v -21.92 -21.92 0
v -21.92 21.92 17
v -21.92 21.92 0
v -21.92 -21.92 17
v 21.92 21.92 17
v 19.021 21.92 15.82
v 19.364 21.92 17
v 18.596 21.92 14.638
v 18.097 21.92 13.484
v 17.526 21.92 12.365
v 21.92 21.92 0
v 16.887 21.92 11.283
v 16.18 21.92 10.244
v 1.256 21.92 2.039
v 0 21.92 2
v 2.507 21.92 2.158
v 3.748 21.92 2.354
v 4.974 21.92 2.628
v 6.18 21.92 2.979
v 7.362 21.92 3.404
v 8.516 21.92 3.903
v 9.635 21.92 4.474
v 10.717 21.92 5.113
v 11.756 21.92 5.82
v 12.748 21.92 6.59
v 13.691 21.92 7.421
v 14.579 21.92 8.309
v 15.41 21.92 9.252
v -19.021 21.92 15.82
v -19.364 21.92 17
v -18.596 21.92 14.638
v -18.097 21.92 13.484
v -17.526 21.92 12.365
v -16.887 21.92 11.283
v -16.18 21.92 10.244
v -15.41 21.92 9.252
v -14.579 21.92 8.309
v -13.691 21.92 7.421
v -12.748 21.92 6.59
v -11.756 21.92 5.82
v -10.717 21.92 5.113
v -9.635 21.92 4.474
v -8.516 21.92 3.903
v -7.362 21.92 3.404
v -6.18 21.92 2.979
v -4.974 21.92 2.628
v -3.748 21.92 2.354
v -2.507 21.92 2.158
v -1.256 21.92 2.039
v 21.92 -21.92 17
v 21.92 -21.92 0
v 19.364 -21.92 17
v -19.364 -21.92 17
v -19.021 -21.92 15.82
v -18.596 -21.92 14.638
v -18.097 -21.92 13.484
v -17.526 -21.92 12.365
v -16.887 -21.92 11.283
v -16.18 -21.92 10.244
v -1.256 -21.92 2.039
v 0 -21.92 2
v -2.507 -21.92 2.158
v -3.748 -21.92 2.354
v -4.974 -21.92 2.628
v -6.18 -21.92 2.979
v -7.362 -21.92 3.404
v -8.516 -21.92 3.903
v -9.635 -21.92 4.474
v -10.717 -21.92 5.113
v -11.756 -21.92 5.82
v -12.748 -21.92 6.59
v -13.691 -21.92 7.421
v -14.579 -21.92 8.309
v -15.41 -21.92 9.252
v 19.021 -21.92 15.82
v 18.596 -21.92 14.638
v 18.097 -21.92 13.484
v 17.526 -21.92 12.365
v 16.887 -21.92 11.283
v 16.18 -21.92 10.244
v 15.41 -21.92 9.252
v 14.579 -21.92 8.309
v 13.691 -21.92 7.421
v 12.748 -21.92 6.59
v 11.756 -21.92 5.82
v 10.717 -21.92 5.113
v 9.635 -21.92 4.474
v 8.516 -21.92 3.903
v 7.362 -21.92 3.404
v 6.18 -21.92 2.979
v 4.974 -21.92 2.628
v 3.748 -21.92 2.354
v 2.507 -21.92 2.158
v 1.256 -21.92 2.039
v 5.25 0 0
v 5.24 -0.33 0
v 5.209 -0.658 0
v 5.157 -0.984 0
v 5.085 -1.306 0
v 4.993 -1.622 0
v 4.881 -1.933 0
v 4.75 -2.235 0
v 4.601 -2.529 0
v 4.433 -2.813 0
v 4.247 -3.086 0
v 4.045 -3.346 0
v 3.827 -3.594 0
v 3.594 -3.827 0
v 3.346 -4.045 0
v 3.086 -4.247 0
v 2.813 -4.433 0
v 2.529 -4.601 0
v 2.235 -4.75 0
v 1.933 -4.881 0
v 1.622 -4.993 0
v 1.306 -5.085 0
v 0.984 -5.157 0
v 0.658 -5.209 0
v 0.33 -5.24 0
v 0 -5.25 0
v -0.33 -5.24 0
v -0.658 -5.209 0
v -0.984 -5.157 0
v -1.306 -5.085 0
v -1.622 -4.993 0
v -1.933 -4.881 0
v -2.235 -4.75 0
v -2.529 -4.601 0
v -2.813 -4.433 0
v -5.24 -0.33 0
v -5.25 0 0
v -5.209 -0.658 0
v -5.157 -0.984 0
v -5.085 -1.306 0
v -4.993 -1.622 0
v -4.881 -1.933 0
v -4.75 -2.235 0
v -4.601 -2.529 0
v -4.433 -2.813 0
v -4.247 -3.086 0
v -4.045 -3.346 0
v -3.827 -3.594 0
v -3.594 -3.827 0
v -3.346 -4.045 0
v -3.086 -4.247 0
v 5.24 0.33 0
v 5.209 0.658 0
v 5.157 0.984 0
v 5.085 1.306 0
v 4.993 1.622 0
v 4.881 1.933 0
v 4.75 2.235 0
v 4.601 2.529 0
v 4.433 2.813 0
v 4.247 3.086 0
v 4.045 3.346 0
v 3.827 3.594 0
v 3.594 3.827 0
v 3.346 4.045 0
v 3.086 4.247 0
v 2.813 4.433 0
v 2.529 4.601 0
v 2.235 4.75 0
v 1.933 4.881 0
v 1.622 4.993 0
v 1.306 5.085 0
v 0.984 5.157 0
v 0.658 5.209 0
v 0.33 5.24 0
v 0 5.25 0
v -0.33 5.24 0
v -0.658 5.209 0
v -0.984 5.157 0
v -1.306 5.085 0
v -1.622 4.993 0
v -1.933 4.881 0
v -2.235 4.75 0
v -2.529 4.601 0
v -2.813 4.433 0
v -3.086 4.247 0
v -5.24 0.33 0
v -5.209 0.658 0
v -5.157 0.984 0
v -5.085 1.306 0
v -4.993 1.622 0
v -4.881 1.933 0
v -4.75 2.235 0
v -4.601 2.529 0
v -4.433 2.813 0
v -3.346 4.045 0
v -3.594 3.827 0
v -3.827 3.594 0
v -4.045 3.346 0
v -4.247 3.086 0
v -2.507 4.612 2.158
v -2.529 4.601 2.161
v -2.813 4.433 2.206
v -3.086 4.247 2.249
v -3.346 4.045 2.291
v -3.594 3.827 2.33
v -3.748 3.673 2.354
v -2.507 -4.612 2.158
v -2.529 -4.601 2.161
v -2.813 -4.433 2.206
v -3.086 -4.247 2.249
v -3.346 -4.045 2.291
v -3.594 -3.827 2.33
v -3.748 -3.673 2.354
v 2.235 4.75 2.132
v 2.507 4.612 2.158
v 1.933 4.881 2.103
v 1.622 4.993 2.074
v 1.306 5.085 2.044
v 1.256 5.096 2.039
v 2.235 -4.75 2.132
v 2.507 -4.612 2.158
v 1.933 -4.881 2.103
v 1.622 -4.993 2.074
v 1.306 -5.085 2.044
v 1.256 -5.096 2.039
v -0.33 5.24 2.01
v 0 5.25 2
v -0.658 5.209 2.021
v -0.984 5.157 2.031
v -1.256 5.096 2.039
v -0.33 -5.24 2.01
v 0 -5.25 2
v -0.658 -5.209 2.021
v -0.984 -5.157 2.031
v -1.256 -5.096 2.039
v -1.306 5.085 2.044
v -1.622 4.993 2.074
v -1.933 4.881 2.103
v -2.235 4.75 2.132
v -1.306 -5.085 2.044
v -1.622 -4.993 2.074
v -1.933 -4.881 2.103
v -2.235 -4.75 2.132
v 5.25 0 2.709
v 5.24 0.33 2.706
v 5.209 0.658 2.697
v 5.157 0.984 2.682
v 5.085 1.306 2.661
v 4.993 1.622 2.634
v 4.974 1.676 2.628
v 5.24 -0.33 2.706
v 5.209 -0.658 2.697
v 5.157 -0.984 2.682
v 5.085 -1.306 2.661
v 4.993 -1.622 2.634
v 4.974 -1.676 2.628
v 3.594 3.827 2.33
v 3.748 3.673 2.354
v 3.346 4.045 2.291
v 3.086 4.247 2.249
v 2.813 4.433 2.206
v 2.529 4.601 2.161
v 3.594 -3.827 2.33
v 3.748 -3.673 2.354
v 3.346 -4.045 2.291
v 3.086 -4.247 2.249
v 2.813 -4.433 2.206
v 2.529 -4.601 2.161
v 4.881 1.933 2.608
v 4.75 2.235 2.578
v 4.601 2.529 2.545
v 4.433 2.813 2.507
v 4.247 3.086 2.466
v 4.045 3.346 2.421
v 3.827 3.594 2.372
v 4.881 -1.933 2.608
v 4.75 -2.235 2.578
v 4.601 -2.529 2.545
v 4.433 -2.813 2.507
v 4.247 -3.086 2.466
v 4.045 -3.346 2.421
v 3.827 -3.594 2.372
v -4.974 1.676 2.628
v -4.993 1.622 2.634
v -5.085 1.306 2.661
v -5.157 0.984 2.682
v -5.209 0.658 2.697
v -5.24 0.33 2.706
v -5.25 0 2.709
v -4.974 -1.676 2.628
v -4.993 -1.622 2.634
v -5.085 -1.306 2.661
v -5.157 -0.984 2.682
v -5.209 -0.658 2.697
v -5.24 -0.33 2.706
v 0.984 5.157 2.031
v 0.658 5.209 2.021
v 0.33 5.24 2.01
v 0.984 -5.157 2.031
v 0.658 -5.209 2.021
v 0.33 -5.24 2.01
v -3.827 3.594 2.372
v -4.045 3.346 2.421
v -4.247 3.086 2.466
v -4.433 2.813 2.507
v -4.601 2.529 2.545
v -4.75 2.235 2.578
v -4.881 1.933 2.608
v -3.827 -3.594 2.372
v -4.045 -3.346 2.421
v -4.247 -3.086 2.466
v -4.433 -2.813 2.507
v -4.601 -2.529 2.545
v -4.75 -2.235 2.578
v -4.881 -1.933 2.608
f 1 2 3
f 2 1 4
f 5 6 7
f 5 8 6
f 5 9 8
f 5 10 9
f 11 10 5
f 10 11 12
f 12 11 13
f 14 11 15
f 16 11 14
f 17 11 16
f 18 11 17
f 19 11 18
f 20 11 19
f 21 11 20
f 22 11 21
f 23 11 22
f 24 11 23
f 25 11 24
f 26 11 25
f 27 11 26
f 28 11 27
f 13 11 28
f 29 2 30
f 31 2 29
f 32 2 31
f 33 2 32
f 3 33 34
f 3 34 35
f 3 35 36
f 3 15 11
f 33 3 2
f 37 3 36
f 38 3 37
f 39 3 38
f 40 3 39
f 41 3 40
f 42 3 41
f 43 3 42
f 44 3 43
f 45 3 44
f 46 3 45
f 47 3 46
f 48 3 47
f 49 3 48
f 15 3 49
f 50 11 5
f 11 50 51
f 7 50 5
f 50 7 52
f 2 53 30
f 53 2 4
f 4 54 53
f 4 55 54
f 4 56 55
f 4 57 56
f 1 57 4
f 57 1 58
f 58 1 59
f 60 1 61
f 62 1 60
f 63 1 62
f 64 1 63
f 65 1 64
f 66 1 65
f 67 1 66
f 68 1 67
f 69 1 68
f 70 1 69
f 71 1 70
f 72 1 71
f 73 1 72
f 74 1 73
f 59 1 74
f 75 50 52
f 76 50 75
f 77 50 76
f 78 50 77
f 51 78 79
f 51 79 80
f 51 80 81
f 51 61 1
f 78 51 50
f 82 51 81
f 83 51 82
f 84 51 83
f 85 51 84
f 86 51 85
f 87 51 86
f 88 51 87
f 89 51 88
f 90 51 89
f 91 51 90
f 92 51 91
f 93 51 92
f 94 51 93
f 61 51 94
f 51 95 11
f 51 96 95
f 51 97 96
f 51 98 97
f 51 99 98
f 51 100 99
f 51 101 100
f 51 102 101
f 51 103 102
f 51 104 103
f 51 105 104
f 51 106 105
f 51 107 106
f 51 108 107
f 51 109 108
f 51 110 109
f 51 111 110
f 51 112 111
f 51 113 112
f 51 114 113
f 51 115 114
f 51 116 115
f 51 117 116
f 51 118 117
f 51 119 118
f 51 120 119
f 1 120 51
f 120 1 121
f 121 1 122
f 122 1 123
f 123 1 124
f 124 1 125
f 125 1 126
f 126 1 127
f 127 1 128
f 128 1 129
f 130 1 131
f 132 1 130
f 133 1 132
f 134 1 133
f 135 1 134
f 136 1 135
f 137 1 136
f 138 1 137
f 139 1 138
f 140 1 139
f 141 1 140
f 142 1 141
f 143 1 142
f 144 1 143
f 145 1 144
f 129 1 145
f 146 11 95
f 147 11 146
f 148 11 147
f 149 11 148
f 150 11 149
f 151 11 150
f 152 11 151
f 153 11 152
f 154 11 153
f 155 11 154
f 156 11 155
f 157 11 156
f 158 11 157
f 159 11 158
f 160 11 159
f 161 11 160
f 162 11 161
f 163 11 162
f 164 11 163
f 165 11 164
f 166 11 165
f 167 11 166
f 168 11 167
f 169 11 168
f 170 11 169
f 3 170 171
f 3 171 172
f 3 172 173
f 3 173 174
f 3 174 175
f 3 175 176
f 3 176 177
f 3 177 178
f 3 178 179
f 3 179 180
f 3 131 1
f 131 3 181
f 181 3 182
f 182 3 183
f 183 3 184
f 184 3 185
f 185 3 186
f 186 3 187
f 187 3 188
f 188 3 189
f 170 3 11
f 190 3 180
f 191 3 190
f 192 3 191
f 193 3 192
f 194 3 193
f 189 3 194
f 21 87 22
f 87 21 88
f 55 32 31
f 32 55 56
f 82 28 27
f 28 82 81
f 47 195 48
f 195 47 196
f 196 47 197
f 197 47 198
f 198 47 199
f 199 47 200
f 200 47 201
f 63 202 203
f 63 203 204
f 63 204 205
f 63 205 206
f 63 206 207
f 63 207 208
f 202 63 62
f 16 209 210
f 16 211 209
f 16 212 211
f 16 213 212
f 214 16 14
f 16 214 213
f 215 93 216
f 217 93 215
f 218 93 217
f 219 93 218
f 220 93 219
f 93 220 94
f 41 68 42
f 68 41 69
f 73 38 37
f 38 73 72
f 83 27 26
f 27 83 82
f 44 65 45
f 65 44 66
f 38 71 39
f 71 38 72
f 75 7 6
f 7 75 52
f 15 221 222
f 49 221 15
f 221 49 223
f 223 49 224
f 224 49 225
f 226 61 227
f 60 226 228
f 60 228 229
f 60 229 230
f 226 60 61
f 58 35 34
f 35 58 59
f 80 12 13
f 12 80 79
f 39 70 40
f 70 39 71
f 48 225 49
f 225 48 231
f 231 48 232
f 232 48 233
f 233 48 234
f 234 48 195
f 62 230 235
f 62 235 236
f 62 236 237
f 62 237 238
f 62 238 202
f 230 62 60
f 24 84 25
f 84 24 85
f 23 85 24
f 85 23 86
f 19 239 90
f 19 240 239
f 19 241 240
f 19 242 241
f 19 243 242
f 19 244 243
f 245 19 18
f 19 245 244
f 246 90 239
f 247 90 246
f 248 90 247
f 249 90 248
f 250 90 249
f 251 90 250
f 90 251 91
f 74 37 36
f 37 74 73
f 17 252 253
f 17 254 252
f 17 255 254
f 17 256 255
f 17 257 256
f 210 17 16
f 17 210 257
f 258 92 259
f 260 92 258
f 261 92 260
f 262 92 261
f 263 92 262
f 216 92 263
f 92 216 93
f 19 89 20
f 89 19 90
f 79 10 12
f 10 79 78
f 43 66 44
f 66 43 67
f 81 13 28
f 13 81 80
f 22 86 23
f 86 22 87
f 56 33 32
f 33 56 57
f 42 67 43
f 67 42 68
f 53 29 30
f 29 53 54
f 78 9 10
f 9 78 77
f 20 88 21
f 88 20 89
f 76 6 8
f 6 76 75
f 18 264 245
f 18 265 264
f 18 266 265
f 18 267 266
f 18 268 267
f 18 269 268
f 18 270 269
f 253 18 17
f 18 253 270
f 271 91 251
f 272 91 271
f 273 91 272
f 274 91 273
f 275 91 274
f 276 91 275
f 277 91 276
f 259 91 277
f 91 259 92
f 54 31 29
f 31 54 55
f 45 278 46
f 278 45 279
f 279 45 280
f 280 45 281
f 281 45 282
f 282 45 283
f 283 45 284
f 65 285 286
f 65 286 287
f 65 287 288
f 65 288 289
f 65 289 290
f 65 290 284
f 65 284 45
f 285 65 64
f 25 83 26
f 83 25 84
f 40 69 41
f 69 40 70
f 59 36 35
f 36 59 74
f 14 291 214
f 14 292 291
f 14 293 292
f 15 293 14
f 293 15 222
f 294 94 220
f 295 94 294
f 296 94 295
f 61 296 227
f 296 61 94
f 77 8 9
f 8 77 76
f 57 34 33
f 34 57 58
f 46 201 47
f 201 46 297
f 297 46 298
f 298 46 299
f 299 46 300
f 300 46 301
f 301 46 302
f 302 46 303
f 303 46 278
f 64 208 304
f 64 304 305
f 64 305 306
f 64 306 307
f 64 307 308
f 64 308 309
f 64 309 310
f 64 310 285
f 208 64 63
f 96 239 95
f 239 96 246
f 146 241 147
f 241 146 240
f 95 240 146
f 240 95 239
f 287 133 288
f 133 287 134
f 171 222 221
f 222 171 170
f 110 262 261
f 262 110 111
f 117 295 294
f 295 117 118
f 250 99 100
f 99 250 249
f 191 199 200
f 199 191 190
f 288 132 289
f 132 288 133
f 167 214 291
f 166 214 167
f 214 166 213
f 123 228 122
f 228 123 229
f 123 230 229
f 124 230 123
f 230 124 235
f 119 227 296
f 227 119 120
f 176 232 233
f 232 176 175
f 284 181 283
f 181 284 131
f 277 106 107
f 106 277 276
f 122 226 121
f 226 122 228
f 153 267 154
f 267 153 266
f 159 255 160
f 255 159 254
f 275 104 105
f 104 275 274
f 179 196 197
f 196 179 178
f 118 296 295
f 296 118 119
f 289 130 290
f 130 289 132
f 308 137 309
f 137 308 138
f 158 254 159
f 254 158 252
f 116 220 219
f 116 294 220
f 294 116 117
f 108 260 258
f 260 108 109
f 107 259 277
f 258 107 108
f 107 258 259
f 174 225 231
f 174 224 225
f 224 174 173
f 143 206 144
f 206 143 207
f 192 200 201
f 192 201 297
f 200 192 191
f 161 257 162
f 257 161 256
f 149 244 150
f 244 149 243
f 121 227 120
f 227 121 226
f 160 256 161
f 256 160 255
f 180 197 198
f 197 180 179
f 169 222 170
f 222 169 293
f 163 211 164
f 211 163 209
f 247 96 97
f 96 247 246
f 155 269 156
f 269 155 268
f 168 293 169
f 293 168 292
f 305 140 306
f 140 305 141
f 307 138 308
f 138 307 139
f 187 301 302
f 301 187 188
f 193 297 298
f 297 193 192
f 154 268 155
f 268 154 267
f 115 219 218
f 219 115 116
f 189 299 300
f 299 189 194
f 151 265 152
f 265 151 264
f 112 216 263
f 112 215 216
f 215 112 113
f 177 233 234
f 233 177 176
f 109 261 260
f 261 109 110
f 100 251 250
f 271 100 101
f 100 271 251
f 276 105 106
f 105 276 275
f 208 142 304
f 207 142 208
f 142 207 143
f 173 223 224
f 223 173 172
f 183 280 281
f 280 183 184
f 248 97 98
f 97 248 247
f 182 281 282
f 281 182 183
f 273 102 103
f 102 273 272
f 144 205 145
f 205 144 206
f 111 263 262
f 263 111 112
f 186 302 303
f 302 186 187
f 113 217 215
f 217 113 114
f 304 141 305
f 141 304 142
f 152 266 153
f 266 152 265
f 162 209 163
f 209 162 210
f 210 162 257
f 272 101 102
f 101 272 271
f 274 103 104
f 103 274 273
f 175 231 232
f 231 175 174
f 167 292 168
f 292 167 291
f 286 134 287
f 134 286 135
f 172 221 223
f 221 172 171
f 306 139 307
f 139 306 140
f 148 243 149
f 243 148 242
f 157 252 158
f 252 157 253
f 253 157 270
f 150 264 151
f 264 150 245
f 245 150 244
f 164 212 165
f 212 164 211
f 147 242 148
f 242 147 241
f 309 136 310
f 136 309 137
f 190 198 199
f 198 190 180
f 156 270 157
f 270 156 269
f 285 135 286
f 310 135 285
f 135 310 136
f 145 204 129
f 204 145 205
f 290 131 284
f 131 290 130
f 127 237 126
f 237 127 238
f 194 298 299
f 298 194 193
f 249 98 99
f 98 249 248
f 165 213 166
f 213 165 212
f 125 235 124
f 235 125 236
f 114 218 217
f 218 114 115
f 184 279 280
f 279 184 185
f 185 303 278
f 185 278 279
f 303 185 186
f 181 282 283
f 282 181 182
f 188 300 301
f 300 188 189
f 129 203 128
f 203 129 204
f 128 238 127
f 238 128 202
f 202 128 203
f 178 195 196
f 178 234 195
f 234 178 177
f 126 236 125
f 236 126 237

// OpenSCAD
// Pipe Spacer for Anemometer Mount
// Version: v0.02
// Description: Parametric spacer to offset an aluminium pipe from a wall.
// The spacer body is cylindrical to prevent dust accumulation and improve aesthetics.
// The wall side is flat, and the pipe side has a cylindrical cutout to
// cradle and support the 40mm pipe securely. Designed for M8 bolts.

/* [Dimensions] */

// Outer diameter of the aluminium pipe
pipe_od = 40;

// Required offset distance from the wall to the closest edge of the pipe
wall_offset = 2;

// Outer diameter of the cylindrical spacer body
spacer_diameter = 62;

// How deeply the spacer wraps around / cradles the pipe (must be < pipe_od/2)
cradle_depth = 15;

/* [Hardware] */

// Bolt clearance hole diameter (8.5mm provides clearance for an M8 bolt)
bolt_hole_dia = 10.5;

/* [Rendering Settings] */

// Number of facets for cylinders (determines curve smoothness)
$fn = 100;

module pipe_spacer() {
    pipe_r = pipe_od / 2;

    // Total height of the printed body before the concave cutout is subtracted
    total_height = wall_offset + cradle_depth;

    difference() {
        // Main solid body - Cylindrical shape for neatness and dust shedding
        // Centered at X=0, Y=0, extending from Z=0 (the wall surface)
        rotate([0,0,45]) {
            #cylinder(h=total_height, d=spacer_diameter, $fn=4);
        }
        // Concave cutout for the pipe
        // The closest edge of the pipe to the wall is exactly at Z = wall_offset
        // Therefore, the center axis of the pipe is at Z = wall_offset + pipe_r
        // Oriented along the Y-axis to cradle the pipe
        translate([0, 0, wall_offset + pipe_r]) {
            rotate([90, 0, 0]) {
                cylinder(h=spacer_diameter + 2, r=pipe_r, center=true);
            }
        }

        // Center hole for the M8 mounting bolt
        // Passes entirely through the spacer from the wall to the pipe
        translate([0, 0, -1]) {
            cylinder(h=total_height + 2, d=bolt_hole_dia);
        }
    }
}

// Render the final part
pipe_spacer();
